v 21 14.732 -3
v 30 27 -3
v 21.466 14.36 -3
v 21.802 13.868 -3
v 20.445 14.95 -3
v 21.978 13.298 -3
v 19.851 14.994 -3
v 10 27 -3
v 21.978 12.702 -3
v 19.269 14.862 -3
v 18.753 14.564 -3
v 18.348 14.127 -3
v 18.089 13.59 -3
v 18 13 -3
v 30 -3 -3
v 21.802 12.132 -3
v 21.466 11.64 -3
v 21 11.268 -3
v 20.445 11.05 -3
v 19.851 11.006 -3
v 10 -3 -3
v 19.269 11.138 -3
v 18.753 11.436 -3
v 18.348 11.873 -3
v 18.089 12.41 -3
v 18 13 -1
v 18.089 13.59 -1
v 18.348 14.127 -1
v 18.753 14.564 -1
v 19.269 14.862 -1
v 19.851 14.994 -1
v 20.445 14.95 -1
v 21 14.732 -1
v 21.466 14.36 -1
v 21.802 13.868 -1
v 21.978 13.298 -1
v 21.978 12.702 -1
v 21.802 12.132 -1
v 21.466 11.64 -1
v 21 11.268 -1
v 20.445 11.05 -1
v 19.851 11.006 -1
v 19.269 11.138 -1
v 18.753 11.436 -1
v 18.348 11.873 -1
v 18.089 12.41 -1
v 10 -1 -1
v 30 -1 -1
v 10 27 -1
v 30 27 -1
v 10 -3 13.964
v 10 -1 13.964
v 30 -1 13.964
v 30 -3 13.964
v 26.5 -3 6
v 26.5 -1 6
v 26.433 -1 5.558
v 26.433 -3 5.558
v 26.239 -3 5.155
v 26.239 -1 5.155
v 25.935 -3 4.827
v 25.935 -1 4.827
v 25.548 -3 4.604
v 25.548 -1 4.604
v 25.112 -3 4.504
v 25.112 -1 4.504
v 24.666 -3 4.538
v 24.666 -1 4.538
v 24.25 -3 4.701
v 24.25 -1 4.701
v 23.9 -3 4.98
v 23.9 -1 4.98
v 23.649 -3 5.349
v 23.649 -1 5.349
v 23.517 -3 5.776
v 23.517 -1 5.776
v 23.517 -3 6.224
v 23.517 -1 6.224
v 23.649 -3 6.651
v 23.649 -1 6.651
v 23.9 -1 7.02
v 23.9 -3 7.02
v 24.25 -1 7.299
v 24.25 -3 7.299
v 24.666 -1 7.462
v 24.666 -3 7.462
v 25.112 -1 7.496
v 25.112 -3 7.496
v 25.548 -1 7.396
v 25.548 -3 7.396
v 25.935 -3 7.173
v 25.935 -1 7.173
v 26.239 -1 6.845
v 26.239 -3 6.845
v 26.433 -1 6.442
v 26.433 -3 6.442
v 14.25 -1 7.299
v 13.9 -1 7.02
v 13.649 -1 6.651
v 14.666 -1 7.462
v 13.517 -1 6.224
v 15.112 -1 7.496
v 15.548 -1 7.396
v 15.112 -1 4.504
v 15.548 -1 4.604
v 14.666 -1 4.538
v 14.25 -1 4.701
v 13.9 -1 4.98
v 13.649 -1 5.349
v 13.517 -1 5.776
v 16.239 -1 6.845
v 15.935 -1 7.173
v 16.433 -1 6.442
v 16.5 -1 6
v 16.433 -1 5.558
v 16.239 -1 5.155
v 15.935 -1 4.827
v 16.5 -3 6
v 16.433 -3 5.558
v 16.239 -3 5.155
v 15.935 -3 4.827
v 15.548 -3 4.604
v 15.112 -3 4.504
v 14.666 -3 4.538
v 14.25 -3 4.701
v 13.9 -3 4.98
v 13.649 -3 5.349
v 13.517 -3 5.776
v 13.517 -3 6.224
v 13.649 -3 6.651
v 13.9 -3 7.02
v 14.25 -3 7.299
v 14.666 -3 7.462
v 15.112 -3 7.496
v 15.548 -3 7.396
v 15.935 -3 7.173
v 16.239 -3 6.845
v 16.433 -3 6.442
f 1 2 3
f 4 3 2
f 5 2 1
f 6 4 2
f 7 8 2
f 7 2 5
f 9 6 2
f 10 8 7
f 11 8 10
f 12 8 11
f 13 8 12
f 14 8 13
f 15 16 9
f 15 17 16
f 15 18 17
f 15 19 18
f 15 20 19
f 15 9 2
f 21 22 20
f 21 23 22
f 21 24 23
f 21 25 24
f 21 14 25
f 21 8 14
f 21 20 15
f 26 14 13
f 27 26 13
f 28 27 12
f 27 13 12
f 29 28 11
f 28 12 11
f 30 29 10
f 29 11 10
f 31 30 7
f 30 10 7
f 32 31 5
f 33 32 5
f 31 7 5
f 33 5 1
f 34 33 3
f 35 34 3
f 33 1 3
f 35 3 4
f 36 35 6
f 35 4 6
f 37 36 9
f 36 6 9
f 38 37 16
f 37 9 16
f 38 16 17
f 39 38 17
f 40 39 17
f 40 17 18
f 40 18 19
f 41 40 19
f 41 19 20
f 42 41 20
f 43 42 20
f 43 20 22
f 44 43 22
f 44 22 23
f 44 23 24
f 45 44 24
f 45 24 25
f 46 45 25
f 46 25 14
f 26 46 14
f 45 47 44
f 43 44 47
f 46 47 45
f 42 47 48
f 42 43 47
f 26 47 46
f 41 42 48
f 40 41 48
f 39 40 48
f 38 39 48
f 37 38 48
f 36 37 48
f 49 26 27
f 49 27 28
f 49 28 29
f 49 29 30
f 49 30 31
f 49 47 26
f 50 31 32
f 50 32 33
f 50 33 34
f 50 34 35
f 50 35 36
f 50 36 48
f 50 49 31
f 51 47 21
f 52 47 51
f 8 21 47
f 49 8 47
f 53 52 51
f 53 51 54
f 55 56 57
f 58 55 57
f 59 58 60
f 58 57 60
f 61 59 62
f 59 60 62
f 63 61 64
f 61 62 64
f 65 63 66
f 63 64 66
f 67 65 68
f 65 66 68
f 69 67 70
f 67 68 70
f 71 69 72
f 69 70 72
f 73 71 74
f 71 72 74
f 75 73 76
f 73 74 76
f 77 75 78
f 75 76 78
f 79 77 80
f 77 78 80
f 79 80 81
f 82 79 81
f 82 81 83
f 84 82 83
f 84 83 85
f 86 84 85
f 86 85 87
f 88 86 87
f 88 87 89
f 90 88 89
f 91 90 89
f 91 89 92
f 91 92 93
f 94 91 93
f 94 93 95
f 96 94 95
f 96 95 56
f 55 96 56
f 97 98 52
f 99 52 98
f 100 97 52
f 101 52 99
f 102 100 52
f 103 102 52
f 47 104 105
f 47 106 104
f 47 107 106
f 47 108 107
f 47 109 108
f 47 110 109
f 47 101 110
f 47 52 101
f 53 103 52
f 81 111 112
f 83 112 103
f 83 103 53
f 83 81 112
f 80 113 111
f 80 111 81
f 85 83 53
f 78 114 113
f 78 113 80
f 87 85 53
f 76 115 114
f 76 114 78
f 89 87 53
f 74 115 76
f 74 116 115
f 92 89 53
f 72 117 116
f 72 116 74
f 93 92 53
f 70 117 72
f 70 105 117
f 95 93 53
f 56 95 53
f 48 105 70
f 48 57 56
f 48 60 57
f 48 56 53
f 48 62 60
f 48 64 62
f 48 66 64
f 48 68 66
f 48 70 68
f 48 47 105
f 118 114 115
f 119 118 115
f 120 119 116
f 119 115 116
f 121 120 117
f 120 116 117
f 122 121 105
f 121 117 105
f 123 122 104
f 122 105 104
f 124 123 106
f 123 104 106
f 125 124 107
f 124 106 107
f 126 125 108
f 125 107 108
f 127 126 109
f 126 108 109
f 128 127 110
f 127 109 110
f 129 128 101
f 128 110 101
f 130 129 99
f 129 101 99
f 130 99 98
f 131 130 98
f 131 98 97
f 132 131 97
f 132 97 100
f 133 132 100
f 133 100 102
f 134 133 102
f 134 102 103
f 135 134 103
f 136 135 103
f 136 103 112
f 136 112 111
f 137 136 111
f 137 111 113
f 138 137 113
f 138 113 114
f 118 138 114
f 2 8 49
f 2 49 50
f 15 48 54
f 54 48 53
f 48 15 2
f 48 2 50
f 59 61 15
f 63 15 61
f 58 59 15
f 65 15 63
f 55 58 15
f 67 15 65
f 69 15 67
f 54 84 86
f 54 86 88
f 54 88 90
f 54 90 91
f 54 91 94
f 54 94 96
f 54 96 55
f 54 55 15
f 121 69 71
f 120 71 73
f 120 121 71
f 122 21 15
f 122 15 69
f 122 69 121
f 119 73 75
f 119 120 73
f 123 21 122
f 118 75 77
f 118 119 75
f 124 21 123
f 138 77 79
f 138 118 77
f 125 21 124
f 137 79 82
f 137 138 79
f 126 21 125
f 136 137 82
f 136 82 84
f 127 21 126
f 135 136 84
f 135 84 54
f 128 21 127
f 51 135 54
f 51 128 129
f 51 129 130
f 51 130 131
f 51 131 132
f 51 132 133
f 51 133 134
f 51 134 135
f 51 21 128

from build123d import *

# Parameters (mm, degrees)
EXTRUDE_1_DEPTH      = 30
SKETCH_6_W           = 21.999074129
SKETCH_6_H           = 43.978081363
CUT_EXTRUDE_5_DEPTH  = 10
SKETCH_7_W           = 30
SKETCH_7_H           = 21.035862509
CUT_EXTRUDE_6_DEPTH  = 10
SKETCH_8_R           = 1.5
CUT_EXTRUDE_7_DEPTH  = 10
SKETCH_9_W           = 20
SKETCH_9_H           = 13.964137491
CUT_EXTRUDE_8_DEPTH  = 1
SKETCH_10_W          = 20
SKETCH_10_H          = 36
CUT_EXTRUDE_9_DEPTH  = 1
SKETCH_11_W          = 20
SKETCH_11_H          = 2
CUT_EXTRUDE_10_DEPTH = 8
SKETCH_12_R          = 2
CUT_EXTRUDE_11_DEPTH = 8


with BuildPart() as part:
    # 草图1 → 凸台-拉伸1 (new body)
    with BuildSketch(Plane(origin=(0, 0, 0), x_dir=(0, 0, -1), z_dir=(1, 0, 0))):
        Polygon((0, 0), (0, 35), (3, 35), (3, -3), (-35, -3), (-35, 0), align=None)
    extrude(amount=EXTRUDE_1_DEPTH)

    # 草图6 → 切除-拉伸5 (cut)
    with BuildSketch(Plane.ZY):
        with Locations((2.964600426, 15.968723176)):
            Rectangle(SKETCH_6_W, SKETCH_6_H)
    extrude(amount=-CUT_EXTRUDE_5_DEPTH, mode=Mode.SUBTRACT)

    # 草图7 → 切除-拉伸6 (cut)
    with BuildSketch(Plane(origin=(0, 0, 0), x_dir=(1, 0, 0), z_dir=(0, 1, 0))):
        with Locations((15, -24.482068746)):
            Rectangle(SKETCH_7_W, SKETCH_7_H)
    extrude(amount=-CUT_EXTRUDE_6_DEPTH, mode=Mode.SUBTRACT)

    # 草图8 → 切除-拉伸7 (cut)
    with BuildSketch(Plane(origin=(0, 0, 0), x_dir=(1, 0, 0), z_dir=(0, 1, 0))):
        with Locations((15, -6)):
            Circle(SKETCH_8_R)
        with Locations((25, -6)):
            Circle(SKETCH_8_R)
    extrude(amount=-CUT_EXTRUDE_7_DEPTH, mode=Mode.SUBTRACT)

    # 草图9 → 切除-拉伸8 (cut)
    with BuildSketch(Plane(origin=(0, 0, 0), x_dir=(1, 0, 0), z_dir=(0, 1, 0))):
        with Locations((20, -6.982068746)):
            Rectangle(SKETCH_9_W, SKETCH_9_H)
    extrude(amount=-CUT_EXTRUDE_8_DEPTH, mode=Mode.SUBTRACT)

    # 草图10 → 切除-拉伸9 (cut)
    with BuildSketch(Plane.XY):
        with Locations((20, 17)):
            Rectangle(SKETCH_10_W, SKETCH_10_H)
    extrude(amount=-CUT_EXTRUDE_9_DEPTH, mode=Mode.SUBTRACT)

    # 草图11 → 切除-拉伸10 (cut)
    with BuildSketch(Plane(origin=(0, 35, 0), x_dir=(1, 0, 0), z_dir=(0, 1, 0))):
        with Locations((20, 2)):
            Rectangle(SKETCH_11_W, SKETCH_11_H)
    extrude(amount=-CUT_EXTRUDE_10_DEPTH, mode=Mode.SUBTRACT)

    # 草图12 → 切除-拉伸11 (cut)
    with BuildSketch(Plane(origin=(0, 0, -3), x_dir=(-1, 0, 0), z_dir=(0, 0, -1))):
        with Locations((-20, 13)):
            Circle(SKETCH_12_R)
    extrude(amount=-CUT_EXTRUDE_11_DEPTH, mode=Mode.SUBTRACT)


solid = part.part
